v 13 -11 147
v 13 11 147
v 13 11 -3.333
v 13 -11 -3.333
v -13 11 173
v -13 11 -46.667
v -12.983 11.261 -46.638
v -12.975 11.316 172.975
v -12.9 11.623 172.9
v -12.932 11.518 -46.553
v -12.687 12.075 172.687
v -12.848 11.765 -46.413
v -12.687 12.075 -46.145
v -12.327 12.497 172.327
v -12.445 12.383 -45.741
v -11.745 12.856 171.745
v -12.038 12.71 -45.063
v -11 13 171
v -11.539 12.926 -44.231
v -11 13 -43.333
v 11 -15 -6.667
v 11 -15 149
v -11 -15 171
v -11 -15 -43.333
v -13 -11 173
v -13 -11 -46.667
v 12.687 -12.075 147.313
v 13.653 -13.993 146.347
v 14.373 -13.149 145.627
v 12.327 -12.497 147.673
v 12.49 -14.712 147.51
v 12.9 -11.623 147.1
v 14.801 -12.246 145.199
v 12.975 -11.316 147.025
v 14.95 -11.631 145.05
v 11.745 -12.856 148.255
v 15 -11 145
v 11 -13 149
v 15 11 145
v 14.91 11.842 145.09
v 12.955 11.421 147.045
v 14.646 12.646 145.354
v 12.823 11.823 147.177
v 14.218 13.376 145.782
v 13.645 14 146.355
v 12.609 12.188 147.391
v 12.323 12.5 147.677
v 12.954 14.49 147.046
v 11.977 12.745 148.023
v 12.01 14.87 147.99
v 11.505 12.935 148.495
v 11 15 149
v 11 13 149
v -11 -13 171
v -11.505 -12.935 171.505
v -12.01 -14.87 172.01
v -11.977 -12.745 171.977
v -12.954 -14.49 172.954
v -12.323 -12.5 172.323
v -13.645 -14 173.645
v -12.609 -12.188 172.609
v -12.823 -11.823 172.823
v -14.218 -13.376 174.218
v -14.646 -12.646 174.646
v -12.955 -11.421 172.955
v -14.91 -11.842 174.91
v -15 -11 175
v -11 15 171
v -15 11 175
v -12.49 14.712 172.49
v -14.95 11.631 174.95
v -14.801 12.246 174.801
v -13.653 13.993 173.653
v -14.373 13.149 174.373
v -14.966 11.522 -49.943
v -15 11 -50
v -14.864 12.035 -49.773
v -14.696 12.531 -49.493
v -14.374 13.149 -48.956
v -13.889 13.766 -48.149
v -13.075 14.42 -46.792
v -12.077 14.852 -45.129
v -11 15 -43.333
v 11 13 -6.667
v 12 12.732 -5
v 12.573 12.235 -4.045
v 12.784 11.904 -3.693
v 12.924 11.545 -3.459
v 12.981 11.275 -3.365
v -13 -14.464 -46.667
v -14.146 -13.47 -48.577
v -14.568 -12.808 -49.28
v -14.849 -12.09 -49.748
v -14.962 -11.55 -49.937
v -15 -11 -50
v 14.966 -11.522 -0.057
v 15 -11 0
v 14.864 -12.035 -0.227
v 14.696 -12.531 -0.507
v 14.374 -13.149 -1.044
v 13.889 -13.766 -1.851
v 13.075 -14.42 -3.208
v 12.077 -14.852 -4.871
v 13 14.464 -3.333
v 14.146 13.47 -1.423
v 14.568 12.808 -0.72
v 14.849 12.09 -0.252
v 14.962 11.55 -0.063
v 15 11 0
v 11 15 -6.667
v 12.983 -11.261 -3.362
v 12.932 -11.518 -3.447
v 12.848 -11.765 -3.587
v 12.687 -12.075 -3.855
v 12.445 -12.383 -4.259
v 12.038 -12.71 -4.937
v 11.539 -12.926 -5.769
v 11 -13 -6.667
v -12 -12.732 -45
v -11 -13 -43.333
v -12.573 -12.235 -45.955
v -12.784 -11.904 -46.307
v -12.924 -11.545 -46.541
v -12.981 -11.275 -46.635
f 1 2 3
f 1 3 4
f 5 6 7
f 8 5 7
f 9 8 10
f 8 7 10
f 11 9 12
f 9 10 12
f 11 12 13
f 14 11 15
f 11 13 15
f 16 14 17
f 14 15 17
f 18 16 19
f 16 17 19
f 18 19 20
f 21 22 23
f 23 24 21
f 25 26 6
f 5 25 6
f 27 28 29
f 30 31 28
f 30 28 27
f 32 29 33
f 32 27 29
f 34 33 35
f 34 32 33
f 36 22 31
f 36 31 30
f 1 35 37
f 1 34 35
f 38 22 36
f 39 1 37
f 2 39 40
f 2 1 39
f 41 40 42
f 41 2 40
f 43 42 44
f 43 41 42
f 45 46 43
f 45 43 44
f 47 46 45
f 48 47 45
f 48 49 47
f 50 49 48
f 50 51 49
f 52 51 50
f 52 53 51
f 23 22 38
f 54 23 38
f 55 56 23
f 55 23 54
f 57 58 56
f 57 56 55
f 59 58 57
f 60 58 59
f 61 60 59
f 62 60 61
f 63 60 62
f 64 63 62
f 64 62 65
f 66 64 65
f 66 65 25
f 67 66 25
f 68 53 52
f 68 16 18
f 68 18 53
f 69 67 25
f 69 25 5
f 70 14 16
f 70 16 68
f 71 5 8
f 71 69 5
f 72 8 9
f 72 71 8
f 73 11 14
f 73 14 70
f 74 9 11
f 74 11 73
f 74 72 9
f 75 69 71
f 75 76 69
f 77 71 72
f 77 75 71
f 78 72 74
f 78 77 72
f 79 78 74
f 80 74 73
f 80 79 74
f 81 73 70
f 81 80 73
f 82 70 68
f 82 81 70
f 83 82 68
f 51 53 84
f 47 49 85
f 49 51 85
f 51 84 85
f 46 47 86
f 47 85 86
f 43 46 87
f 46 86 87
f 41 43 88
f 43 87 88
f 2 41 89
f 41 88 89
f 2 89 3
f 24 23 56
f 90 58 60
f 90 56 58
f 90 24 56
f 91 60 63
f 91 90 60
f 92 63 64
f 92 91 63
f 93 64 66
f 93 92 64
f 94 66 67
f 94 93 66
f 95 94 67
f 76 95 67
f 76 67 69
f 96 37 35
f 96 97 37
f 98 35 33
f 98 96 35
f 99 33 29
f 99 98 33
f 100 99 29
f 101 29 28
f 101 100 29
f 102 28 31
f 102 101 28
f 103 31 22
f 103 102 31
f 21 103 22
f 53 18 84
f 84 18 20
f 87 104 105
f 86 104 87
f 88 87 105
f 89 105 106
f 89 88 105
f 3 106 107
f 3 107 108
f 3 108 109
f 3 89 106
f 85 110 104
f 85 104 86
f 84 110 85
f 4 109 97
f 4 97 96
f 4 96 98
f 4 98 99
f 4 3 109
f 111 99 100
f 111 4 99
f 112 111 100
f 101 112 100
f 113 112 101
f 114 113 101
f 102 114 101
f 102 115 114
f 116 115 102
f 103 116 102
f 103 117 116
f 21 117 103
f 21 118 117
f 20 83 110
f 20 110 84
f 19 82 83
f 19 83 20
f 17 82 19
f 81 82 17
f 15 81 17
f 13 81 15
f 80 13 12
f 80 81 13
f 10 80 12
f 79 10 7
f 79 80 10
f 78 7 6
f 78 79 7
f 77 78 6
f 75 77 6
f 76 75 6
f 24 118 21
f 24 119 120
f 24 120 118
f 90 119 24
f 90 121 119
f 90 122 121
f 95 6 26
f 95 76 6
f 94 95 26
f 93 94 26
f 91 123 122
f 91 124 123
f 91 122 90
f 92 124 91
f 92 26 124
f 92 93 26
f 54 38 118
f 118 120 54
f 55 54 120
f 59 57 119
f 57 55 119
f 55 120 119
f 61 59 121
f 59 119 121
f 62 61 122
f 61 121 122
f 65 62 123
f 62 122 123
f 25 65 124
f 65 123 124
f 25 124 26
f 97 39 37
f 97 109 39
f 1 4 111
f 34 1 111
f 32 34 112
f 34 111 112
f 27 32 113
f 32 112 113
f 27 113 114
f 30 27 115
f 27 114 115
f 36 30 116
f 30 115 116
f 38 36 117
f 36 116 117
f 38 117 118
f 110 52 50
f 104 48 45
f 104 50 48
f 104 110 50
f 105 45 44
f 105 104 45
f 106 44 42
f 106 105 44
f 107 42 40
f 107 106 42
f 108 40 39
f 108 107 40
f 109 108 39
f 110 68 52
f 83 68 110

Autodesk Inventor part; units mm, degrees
ref_plane "Plano inicial" through (0, 0, -50) normal (0, 0, 1) x (1, 0, 0)
ref_plane "Plano final" through (0, 0, 175) normal (0, 0, 1) x (1, 0, 0)
sketch "Esboço" plane through (0, 0, 0) normal (0, 0, 1) x (1, 0, 0)
  line L0 (-15, -11) -> (-15, 11)
  line L1 (-11, 15) -> (11, 15)
  line L2 (15, 11) -> (15, -11)
  line L3 (11, -15) -> (-11, -15)
  arc A0 (-15, -11) -> (-11, -15) centre (-11, -11) ccw
  arc A1 (15, 11) -> (11, 15) centre (11, 11) ccw
  arc A2 (-11, 15) -> (-15, 11) centre (-11, 11) ccw
  arc A3 (11, -15) -> (15, -11) centre (11, -11) ccw
  arc A4 (-11, 13) -> (-13, 11) centre (-11, 11) ccw
  line L4 (-11, 13) -> (11, 13)
  arc A5 (13, 11) -> (11, 13) centre (11, 11) ccw
  line L5 (13, 11) -> (13, -11)
  arc A6 (11, -13) -> (13, -11) centre (11, -11) ccw
  line L6 (11, -13) -> (-11, -13)
  arc A7 (-13, -11) -> (-11, -13) centre (-11, -11) ccw
  line L7 (-13, -11) -> (-13, 11)
  line L8 (0, 22.1598) -> (0, -22.1598) construction
  line L9 (-22.1598, 0) -> (22.1598, 0) construction
  dimension "d7" = 4
  dimension "d9" = 30
  dimension "d11" = 30
  dimension "d12" = 2
  dimension "d15" = 15
  dimension "d16" = 15
extrude "Corpo" add sketch "Esboço" along normal up to surface (225 mm away) from surface at -50
sketch "Sketch3" plane through (0, 0, 0) normal (0, 0, 1) x (1, 0, 0)
  line L0 (0, 0) -> (10, 0)
ref_plane "Work Plane3" through (0, 0, 0) normal (0, -1, 0) x (1, 0, 0)
sketch "Sketch4" plane through (0, 0, 0) normal (0, -1, 0) x (1, 0, 0)
  line L0 (-2, -50) -> (12, -50)
  line L1 (-2, 175) -> (12, 175)
  dimension "d18" = 225
ref_plane "Plano de trabalho5" through (-15, 0, 175) normal (0.7071, 0, 0.7071) x (0.7071, 0, -0.7071)
split "Dividir2" plane through (-15, 0, 175) removes the side toward (0.7071, 0, 0.7071)
ref_plane "Plano de trabalho6" through (0, 15, 175) normal (0, 0, 1) x (1, 0, 0)
split "Dividir3" plane through (0, 15, 175) removes the side toward (0, 0, 1)
ref_plane "Plano de trabalho7" through (-15, 2.5, -50) normal (0.8575, 0, -0.5145) x (-0.5145, 0, -0.8575)
split "Dividir4" plane through (-15, 2.5, -50) removes the side toward (0.8575, 0, -0.5145)
equation "\"d7\" = G_IR"
equation "\"d9\" = G_W"
equation "\"d11\" = G_H"
equation "\"d12\" = G_T"
equation "\"d15\" = 0.5 * d9"
equation "\"d16\" = 0.5 * d11"
equation "\"d3\" = G_L"
equation "\"G_W\" = 30"
equation "\"G_H\" = 30"
equation "\"G_T\" = 2"
equation "\"G_IR\" = 4"
equation "\"G_L\" = d18"
equation "\"G_OFFSET_END\" = 0"
equation "\"d14\" = G_OFFSET_END + B_L"
equation "\"B_L\" = 175"
properties part number "ISO 10799-2 - 30x30x2 - 225" material "Aço, suave"
